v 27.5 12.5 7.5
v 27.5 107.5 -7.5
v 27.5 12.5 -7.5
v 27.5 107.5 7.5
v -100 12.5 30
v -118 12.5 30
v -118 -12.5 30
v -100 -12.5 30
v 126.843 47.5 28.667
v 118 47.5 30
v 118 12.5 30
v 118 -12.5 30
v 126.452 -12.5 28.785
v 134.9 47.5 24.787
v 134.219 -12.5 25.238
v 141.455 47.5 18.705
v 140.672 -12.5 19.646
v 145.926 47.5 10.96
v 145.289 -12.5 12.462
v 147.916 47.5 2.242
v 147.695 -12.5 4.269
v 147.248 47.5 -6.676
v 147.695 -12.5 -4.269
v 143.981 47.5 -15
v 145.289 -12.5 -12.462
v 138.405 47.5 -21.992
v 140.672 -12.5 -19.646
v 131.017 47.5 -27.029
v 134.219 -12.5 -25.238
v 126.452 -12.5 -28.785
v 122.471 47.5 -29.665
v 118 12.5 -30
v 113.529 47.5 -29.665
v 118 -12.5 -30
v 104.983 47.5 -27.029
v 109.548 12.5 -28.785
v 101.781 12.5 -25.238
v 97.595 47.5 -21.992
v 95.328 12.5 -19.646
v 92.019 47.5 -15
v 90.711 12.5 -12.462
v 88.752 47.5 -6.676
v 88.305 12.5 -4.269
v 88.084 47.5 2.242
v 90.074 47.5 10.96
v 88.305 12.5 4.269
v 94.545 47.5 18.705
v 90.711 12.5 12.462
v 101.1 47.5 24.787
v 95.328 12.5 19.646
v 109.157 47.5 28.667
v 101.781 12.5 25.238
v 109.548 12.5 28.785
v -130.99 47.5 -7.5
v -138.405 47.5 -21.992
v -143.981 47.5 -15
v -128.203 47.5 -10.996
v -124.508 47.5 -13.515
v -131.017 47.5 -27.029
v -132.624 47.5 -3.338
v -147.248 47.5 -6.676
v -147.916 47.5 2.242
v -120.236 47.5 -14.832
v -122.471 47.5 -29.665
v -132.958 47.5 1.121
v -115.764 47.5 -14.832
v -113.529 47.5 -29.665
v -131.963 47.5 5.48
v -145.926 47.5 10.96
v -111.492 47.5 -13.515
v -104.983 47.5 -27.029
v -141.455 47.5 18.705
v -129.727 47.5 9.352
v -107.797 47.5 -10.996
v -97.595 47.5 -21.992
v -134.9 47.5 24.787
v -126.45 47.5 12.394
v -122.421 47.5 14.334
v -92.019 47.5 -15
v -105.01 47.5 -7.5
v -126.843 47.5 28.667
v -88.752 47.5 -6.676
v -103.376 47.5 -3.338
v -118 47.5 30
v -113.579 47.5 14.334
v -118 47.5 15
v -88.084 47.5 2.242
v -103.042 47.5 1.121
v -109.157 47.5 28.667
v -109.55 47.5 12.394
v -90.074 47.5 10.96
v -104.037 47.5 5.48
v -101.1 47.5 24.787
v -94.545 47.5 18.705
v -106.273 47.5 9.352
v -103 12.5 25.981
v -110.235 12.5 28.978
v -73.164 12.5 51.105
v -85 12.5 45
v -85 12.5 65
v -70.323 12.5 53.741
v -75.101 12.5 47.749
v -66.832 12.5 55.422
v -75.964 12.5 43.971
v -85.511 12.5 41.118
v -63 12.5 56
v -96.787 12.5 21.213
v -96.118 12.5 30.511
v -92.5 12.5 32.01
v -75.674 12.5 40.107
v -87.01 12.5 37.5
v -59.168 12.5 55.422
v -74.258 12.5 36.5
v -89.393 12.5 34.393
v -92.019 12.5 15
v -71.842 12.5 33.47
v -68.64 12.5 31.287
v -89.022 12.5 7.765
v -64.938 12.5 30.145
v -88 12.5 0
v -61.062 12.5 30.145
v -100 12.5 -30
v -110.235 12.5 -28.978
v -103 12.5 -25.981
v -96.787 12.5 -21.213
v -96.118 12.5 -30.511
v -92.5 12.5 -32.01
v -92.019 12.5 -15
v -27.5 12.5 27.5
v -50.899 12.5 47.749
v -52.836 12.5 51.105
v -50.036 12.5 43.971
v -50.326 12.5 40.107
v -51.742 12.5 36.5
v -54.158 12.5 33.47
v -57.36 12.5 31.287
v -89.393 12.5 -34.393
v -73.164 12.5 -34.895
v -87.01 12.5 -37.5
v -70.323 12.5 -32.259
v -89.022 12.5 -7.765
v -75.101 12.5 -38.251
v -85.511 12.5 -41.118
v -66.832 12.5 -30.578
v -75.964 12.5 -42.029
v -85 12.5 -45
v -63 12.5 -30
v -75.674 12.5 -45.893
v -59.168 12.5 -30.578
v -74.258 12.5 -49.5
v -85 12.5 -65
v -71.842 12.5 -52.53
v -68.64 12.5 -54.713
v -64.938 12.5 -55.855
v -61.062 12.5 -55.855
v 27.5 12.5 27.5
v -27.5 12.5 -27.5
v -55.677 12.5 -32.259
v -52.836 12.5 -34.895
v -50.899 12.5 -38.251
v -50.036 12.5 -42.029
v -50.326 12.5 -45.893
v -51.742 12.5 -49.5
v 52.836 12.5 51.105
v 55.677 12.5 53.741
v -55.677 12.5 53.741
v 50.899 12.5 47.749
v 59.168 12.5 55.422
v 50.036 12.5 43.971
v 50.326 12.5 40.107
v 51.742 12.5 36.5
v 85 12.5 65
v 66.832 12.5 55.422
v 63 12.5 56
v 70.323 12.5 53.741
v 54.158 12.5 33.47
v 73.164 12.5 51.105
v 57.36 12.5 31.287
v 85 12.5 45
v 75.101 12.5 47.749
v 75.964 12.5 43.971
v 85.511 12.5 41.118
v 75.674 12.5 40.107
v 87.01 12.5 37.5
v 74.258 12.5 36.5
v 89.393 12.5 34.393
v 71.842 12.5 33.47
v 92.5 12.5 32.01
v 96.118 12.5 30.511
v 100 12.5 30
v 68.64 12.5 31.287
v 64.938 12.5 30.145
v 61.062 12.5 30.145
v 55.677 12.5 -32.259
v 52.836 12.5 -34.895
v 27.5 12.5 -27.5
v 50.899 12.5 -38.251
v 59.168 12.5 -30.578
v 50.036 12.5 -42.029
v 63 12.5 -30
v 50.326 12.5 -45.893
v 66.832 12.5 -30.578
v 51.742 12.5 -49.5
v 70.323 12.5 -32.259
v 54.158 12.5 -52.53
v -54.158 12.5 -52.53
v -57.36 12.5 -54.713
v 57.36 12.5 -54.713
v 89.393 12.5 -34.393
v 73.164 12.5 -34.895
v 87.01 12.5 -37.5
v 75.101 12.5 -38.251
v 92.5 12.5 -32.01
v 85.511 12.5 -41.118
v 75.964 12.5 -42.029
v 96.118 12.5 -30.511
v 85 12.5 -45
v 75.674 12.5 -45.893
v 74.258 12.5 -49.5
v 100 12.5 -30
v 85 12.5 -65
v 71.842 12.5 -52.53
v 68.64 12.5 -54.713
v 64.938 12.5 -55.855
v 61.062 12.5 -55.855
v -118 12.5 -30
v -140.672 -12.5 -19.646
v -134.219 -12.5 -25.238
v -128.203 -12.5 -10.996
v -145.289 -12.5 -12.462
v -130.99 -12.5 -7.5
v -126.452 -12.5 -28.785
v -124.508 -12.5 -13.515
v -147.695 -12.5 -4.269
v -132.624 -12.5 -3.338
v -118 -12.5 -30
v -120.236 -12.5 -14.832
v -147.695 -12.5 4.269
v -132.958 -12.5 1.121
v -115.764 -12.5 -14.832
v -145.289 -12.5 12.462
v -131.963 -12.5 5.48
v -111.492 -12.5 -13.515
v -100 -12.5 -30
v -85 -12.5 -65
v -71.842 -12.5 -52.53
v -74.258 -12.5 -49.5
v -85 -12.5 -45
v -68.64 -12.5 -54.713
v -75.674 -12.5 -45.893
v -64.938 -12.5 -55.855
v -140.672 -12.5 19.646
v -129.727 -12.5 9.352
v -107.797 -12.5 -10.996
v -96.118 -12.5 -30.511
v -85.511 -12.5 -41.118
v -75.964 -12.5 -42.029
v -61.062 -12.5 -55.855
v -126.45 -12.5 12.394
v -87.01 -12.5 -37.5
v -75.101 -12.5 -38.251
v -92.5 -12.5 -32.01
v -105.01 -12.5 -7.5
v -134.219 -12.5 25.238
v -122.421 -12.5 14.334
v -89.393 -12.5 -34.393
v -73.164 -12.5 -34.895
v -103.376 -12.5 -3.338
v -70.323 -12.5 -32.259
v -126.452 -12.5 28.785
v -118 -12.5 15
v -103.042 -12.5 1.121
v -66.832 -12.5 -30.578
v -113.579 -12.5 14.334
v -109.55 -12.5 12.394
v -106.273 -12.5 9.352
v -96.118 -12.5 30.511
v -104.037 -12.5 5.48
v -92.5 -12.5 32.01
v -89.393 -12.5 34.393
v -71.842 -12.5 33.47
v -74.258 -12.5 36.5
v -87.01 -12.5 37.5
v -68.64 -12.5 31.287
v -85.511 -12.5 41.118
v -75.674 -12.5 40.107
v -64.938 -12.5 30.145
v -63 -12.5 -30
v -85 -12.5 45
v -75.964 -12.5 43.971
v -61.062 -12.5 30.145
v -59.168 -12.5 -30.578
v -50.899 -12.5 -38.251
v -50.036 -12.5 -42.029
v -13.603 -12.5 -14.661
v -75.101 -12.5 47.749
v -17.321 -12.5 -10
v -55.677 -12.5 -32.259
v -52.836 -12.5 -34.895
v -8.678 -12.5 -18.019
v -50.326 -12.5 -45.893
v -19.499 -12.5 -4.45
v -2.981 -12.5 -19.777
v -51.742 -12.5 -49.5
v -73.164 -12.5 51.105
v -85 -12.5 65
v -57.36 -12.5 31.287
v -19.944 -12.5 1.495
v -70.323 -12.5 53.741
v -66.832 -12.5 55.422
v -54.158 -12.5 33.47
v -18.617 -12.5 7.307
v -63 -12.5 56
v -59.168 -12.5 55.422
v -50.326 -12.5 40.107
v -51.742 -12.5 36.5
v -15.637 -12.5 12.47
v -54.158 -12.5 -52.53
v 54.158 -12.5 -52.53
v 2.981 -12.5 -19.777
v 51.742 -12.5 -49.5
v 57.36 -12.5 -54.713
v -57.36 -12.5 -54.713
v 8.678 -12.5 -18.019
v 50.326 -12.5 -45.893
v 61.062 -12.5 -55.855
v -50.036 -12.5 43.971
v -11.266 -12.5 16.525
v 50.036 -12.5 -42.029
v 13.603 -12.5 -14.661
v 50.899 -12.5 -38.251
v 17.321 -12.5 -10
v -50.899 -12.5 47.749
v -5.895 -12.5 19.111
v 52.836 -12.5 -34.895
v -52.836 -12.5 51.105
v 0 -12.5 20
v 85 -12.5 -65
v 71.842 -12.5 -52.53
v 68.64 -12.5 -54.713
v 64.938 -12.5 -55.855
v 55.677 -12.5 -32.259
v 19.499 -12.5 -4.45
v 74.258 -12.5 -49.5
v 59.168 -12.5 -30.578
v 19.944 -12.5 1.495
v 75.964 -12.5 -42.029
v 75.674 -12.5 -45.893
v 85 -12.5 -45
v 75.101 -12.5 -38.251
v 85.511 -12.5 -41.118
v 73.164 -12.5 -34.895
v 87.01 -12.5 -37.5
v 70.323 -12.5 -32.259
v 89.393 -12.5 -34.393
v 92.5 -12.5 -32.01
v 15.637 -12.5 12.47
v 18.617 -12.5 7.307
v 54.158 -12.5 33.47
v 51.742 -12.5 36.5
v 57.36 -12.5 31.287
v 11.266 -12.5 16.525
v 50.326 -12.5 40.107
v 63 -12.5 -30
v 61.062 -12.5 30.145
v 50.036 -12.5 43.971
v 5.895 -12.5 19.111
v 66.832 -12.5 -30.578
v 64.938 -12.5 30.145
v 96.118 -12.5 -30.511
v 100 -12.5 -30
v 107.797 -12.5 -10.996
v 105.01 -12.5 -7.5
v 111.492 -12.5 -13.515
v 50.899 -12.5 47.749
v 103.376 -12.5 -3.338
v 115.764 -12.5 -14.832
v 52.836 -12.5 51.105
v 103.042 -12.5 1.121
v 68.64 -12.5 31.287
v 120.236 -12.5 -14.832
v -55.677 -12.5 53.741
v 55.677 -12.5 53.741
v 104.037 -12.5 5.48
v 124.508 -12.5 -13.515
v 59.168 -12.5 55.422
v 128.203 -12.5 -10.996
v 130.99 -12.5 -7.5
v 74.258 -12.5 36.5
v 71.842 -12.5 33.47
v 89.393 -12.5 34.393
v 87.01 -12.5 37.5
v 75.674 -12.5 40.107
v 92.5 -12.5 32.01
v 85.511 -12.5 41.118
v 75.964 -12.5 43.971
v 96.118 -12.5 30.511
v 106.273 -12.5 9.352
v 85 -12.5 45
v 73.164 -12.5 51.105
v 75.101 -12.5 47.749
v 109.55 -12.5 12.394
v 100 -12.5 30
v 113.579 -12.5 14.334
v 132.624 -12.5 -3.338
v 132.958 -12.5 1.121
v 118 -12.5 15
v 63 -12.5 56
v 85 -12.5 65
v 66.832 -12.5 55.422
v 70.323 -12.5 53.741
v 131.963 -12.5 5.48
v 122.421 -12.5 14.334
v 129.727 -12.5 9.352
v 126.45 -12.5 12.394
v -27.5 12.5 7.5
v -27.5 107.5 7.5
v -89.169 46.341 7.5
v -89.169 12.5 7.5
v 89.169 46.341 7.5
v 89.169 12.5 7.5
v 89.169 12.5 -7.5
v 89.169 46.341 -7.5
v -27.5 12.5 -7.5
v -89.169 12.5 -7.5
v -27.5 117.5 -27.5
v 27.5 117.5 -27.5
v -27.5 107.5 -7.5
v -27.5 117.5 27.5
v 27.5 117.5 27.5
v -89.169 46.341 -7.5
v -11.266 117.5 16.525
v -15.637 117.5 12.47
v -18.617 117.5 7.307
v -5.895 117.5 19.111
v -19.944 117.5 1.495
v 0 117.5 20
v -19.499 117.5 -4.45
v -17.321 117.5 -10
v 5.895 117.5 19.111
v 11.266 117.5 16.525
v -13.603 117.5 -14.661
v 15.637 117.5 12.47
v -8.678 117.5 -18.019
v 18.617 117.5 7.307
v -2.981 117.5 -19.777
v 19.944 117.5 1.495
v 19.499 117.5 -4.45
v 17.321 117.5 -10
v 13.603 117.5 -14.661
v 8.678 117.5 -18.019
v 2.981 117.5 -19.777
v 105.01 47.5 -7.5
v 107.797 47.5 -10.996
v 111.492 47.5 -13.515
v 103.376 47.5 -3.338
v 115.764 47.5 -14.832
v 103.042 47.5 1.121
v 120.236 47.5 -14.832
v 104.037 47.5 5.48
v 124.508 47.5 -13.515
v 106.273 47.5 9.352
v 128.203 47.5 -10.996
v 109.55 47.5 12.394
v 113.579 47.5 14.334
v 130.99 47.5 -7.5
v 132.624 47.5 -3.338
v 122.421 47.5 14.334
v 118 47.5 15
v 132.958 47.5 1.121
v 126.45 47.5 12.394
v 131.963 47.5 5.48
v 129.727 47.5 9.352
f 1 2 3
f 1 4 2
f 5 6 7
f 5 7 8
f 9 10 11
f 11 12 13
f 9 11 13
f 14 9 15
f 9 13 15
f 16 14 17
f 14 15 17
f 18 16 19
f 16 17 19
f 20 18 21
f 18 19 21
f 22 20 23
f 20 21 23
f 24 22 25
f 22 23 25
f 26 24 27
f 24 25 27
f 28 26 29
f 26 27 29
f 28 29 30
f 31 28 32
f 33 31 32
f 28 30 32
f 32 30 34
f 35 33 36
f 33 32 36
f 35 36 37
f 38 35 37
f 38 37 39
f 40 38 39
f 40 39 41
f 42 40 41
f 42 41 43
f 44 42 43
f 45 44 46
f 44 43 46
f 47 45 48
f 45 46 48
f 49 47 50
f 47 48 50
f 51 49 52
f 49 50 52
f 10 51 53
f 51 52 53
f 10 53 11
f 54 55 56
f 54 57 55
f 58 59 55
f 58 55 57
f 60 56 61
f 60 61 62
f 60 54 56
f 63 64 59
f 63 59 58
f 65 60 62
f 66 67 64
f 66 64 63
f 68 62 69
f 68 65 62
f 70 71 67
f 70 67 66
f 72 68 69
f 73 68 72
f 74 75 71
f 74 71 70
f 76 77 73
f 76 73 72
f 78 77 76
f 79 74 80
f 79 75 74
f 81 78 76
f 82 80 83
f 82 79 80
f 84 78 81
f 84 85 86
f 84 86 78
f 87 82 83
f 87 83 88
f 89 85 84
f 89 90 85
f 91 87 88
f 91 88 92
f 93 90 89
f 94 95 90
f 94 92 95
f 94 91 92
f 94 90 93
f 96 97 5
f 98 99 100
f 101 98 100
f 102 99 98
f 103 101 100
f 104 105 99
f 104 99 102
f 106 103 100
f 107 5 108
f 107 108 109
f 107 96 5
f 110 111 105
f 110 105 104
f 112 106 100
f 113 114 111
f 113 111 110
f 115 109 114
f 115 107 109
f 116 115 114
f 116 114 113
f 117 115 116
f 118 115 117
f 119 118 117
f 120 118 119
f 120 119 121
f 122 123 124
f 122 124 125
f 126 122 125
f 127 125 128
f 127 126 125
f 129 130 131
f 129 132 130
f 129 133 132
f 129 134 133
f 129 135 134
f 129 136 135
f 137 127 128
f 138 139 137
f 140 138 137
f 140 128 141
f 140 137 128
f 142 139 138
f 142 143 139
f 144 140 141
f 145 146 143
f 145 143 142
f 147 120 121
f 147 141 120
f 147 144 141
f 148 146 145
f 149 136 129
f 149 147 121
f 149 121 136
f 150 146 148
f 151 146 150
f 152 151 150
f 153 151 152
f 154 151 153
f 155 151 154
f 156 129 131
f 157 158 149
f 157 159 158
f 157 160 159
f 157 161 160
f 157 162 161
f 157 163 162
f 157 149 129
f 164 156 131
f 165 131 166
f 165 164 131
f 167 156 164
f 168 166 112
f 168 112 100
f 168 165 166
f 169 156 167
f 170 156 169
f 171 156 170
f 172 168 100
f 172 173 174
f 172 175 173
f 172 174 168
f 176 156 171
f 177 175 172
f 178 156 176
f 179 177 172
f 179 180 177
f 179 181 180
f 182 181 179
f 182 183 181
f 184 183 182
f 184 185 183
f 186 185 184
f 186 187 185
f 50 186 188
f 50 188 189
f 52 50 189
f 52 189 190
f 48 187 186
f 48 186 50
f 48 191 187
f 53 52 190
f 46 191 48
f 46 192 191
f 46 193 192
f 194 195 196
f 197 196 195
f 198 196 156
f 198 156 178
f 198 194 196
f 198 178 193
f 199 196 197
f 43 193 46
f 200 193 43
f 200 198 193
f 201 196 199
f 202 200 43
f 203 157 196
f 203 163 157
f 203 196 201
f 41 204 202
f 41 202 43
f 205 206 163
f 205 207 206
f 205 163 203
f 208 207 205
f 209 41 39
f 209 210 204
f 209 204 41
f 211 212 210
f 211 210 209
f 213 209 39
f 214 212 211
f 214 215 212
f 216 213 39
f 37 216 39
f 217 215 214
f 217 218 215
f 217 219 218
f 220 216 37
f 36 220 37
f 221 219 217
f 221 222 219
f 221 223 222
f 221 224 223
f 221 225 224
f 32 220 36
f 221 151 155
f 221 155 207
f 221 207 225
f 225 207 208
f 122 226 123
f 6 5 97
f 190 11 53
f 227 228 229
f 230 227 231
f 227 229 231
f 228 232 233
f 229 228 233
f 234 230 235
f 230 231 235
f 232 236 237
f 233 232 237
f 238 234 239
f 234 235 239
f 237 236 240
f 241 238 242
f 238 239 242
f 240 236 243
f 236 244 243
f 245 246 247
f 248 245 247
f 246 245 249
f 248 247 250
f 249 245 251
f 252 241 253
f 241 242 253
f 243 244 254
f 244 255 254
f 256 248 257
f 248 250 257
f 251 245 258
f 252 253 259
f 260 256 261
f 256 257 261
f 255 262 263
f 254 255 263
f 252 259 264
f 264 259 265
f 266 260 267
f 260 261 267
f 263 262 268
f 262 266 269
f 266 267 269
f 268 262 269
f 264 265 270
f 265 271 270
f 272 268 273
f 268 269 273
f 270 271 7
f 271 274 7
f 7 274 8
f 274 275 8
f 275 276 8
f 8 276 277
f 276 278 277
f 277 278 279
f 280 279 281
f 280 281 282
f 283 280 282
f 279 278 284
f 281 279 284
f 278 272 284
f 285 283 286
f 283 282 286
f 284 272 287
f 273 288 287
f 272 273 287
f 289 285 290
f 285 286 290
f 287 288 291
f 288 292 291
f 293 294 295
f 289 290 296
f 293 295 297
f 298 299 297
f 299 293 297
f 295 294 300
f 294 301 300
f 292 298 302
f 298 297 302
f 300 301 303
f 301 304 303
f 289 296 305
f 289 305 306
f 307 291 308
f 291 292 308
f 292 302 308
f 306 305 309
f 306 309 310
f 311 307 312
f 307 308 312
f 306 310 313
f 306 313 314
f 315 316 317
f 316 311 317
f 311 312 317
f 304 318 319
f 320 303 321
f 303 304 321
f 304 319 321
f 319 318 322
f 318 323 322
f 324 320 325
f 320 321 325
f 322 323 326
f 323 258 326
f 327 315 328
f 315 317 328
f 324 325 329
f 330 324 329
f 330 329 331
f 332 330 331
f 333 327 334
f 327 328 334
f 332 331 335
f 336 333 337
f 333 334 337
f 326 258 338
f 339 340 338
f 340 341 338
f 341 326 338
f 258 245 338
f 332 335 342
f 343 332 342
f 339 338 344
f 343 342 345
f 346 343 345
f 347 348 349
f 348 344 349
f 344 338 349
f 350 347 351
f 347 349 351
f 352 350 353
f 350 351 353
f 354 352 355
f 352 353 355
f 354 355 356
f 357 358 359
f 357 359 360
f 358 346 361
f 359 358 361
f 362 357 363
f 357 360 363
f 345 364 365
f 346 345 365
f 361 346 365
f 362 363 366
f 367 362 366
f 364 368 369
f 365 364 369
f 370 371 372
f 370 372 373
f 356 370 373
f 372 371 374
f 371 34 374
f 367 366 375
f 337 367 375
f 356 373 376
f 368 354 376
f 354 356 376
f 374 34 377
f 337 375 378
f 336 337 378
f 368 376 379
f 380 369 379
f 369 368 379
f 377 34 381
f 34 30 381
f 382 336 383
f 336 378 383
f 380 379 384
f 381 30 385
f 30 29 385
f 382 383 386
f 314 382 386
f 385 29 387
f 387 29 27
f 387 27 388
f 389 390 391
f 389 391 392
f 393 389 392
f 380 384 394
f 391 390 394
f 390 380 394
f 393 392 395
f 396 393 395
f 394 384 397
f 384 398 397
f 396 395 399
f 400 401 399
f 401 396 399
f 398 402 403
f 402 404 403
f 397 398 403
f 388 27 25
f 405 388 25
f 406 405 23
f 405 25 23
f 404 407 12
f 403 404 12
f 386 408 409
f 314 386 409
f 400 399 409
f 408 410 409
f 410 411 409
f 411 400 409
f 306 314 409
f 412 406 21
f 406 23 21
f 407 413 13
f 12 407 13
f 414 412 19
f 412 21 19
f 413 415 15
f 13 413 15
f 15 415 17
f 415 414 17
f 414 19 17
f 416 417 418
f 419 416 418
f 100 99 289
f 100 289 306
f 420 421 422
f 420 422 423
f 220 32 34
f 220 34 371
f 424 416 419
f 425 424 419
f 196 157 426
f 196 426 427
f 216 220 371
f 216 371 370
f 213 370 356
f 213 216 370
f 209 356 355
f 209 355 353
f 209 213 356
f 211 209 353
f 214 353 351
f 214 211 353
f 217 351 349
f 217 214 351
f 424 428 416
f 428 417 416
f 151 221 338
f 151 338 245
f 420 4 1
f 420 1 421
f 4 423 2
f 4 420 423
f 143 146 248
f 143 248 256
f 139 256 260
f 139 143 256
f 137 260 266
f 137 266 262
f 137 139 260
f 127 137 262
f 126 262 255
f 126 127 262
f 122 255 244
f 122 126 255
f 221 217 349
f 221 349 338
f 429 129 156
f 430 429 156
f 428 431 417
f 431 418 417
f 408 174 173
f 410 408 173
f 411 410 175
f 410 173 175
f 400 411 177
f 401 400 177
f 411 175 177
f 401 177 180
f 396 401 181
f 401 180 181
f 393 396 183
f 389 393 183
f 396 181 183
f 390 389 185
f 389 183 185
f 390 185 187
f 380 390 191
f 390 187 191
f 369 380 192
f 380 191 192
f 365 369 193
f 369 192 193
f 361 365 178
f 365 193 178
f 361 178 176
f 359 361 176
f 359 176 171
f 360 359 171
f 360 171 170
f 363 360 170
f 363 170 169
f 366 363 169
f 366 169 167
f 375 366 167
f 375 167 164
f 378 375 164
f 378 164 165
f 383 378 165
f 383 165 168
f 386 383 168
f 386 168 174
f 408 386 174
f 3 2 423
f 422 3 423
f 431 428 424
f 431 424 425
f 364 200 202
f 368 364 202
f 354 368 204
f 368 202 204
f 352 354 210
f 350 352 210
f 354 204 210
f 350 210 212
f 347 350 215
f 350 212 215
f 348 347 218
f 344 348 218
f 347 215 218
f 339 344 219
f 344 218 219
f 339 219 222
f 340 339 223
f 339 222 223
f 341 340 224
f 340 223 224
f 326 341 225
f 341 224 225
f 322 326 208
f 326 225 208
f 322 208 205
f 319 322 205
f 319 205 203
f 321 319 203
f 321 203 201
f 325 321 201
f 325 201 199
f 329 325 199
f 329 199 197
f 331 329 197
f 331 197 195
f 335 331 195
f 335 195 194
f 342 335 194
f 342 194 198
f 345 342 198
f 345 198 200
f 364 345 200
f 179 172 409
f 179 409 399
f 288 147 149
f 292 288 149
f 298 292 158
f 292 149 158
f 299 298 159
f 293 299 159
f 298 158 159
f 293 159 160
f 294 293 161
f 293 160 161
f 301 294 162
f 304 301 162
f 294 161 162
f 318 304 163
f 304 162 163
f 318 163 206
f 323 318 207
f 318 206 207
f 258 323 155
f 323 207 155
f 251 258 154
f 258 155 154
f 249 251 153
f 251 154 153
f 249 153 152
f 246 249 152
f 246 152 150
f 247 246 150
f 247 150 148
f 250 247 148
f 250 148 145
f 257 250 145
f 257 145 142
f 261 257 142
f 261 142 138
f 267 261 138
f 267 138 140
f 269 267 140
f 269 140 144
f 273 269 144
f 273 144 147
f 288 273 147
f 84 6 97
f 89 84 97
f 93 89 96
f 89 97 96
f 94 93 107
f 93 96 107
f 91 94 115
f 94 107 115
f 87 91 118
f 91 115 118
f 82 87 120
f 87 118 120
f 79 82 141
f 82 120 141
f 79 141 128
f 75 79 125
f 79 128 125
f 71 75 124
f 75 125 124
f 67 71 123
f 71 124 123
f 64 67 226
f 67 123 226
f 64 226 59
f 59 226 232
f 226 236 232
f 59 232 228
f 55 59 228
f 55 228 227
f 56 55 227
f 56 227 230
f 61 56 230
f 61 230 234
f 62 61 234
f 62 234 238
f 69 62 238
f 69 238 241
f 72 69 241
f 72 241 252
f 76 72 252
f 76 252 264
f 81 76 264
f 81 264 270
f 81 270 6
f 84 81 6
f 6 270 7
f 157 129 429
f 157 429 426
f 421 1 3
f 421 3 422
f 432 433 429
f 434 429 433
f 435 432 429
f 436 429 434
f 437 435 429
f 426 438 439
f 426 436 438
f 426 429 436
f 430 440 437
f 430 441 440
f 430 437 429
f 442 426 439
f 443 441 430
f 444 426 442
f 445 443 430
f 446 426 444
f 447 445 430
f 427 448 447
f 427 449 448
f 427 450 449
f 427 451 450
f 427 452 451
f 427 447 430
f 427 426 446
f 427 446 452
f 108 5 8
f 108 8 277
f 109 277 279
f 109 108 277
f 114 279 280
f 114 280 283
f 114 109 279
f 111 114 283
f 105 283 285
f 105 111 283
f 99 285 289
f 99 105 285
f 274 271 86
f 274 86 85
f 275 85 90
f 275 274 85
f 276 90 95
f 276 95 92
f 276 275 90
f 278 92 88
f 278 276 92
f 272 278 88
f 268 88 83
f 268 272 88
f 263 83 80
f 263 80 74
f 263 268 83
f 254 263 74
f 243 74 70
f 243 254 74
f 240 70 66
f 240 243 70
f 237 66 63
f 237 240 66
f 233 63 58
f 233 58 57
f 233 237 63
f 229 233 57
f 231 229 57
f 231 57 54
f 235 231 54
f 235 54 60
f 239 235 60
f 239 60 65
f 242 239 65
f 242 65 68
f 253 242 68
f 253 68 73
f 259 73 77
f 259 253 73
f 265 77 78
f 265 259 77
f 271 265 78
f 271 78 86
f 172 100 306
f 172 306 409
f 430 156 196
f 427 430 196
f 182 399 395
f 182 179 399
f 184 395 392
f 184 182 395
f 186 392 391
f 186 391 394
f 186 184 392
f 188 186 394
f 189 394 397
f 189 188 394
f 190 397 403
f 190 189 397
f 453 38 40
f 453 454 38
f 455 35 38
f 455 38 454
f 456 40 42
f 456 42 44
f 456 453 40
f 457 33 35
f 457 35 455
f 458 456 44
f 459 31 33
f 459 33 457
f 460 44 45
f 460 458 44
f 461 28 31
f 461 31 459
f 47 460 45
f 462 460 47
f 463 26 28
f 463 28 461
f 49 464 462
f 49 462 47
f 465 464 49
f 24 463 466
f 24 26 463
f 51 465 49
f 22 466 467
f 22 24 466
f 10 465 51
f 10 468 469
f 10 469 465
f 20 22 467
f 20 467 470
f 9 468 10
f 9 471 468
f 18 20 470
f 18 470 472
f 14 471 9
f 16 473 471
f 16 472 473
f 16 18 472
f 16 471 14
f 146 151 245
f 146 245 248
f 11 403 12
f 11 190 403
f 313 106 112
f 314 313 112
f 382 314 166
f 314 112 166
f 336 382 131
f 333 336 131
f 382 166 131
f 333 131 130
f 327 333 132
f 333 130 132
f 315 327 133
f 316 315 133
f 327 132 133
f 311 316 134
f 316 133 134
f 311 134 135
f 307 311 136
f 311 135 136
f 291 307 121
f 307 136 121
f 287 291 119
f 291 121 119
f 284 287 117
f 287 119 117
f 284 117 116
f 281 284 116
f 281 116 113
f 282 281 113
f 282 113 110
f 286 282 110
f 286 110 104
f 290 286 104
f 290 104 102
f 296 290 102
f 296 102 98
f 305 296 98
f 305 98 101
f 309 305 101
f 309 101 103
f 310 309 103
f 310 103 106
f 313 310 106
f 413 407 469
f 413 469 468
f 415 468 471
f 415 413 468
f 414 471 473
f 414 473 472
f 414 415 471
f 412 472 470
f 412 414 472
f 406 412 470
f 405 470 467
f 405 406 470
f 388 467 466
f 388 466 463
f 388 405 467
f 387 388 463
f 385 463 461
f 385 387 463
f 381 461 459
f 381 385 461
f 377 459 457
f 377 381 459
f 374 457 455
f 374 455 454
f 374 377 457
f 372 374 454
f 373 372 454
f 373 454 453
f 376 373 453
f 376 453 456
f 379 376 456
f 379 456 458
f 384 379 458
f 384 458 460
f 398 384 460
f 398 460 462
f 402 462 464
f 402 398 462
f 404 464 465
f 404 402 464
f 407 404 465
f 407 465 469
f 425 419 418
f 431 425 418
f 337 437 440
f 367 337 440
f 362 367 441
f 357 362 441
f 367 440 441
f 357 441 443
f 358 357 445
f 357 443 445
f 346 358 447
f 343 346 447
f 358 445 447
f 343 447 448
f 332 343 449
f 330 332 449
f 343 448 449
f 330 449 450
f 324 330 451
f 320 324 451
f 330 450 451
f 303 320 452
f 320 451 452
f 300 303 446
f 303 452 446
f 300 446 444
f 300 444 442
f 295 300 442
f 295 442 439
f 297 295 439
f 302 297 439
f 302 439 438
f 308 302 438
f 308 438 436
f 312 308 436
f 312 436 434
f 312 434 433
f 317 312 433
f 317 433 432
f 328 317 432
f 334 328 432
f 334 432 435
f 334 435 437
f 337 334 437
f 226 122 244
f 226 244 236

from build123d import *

# Parameters (mm, degrees)
BOSS_EXTRUDE1_DEPTH      = 12.5
BOSS_EXTRUDE2_DEPTH      = 47.5
BOSS_EXTRUDE2_DEPTH_BACK = 12.5
SKETCH1_3_R              = 30
SKETCH1_3_R_2            = 15
CUT_EXTRUDE1_REACH       = 167.39
SKETCH2_R                = 13
SKETCH3_W                = 55
SKETCH3_H                = 55
BOSS_EXTRUDE3_DEPTH      = 105
CUT_EXTRUDE2_REACH       = 209.434
SKETCH4_R                = 20
BOSS_EXTRUDE5_DEPTH      = 7.5


with BuildPart() as part:
    # Sketch1 → Boss-Extrude1 (new, symmetric)
    with BuildSketch(Plane(origin=(0, 0, 0), x_dir=(1, 0, 0), z_dir=(0, 1, 0))):
        with BuildLine():
            ThreePointArc((118, -30), (88, 0), (118, 30))
            Line((118, 30), (100, 30))
            ThreePointArc((100, 30), (89.393398282, 34.393398282), (85, 45))
            Line((85, 45), (85, 65))
            Line((85, 65), (-85, 65))
            Line((-85, 65), (-85, 45))
            ThreePointArc((-85, 45), (-89.393398282, 34.393398282), (-100, 30))
            Line((-100, 30), (-118, 30))
            ThreePointArc((-118, 30), (-96.786796564, 21.213203436), (-88, 0))
            ThreePointArc((-88, 0), (-96.786796564, -21.213203436), (-118, -30))
            Line((-118, -30), (-100, -30))
            ThreePointArc((-100, -30), (-89.393398282, -34.393398282), (-85, -45))
            Line((-85, -45), (-85, -65))
            Line((-85, -65), (85, -65))
            Line((85, -65), (85, -45))
            ThreePointArc((85, -45), (89.393398282, -34.393398282), (100, -30))
            Line((100, -30), (118, -30))
        make_face()
    extrude(amount=BOSS_EXTRUDE1_DEPTH, both=True)

    # Sketch1<3> → Boss-Extrude2 (add, two sides: drawn at the far end of the back side and taken through both)
    # profile 1 of 2: a face of its own
    with BuildSketch(Plane(origin=(0, 0, 0), x_dir=(1, 0, 0), z_dir=(0, 1, 0)).offset(-BOSS_EXTRUDE2_DEPTH_BACK)):
        with Locations(Location((-118, 0, 0), (0, 0, 270))):
            Circle(SKETCH1_3_R)
        with Locations(Location((-118, 0, 0), (0, 0, 270))):
            Circle(SKETCH1_3_R_2, mode=Mode.SUBTRACT)
    # profile 2 of 2: a face of its own
    with BuildSketch(Plane(origin=(0, 0, 0), x_dir=(1, 0, 0), z_dir=(0, 1, 0)).offset(-BOSS_EXTRUDE2_DEPTH_BACK)):
        with Locations(Location((118, 0, 0), (0, 0, 270))):
            Circle(SKETCH1_3_R)
        with Locations(Location((118, 0, 0), (0, 0, 270))):
            Circle(SKETCH1_3_R_2, mode=Mode.SUBTRACT)
    extrude(amount=BOSS_EXTRUDE2_DEPTH + BOSS_EXTRUDE2_DEPTH_BACK)

    # Sketch2 → Cut-Extrude1 (cut, up to next)
    with BuildSketch(Plane(origin=(0, 12.5, 0), x_dir=(1, 0, 0), z_dir=(0, 1, 0)), mode=Mode.PRIVATE) as cut_extrude1_sk1:
        with Locations(Location((-63, 43, 0), (0, 0, 270))):
            Circle(SKETCH2_R)
    cut_extrude1_tool1 = extrude(cut_extrude1_sk1.sketch, amount=-CUT_EXTRUDE1_REACH, mode=Mode.PRIVATE) & part.part
    # Sketch2 → Cut-Extrude1 (cut, up to next)
    with BuildSketch(Plane(origin=(0, 12.5, 0), x_dir=(1, 0, 0), z_dir=(0, 1, 0)), mode=Mode.PRIVATE) as cut_extrude1_sk2:
        with Locations(Location((-63, -43, 0), (0, 0, 270))):
            Circle(SKETCH2_R)
    cut_extrude1_tool2 = extrude(cut_extrude1_sk2.sketch, amount=-CUT_EXTRUDE1_REACH, mode=Mode.PRIVATE) & part.part
    # Sketch2 → Cut-Extrude1 (cut, up to next)
    with BuildSketch(Plane(origin=(0, 12.5, 0), x_dir=(1, 0, 0), z_dir=(0, 1, 0)), mode=Mode.PRIVATE) as cut_extrude1_sk3:
        with Locations(Location((63, 43, 0), (0, 0, 270))):
            Circle(SKETCH2_R)
    cut_extrude1_tool3 = extrude(cut_extrude1_sk3.sketch, amount=-CUT_EXTRUDE1_REACH, mode=Mode.PRIVATE) & part.part
    # Sketch2 → Cut-Extrude1 (cut, up to next)
    with BuildSketch(Plane(origin=(0, 12.5, 0), x_dir=(1, 0, 0), z_dir=(0, 1, 0)), mode=Mode.PRIVATE) as cut_extrude1_sk4:
        with Locations(Location((63, -43, 0), (0, 0, 270))):
            Circle(SKETCH2_R)
    cut_extrude1_tool4 = extrude(cut_extrude1_sk4.sketch, amount=-CUT_EXTRUDE1_REACH, mode=Mode.PRIVATE) & part.part
    add(cut_extrude1_tool1.solids().sort_by_distance((-63, 12.5, -43))[0], mode=Mode.SUBTRACT)
    add(cut_extrude1_tool2.solids().sort_by_distance((-63, 12.5, 43))[0], mode=Mode.SUBTRACT)
    add(cut_extrude1_tool3.solids().sort_by_distance((63, 12.5, -43))[0], mode=Mode.SUBTRACT)
    add(cut_extrude1_tool4.solids().sort_by_distance((63, 12.5, 43))[0], mode=Mode.SUBTRACT)

    # Sketch3 → Boss-Extrude3 (add)
    with BuildSketch(Plane(origin=(0, 12.5, 0), x_dir=(1, 0, 0), z_dir=(0, 1, 0))):
        Rectangle(SKETCH3_W, SKETCH3_H)
    extrude(amount=BOSS_EXTRUDE3_DEPTH)

    # Sketch4 → Cut-Extrude2 (cut, up to next)
    with BuildSketch(Plane(origin=(0, 117.5, 0), x_dir=(1, 0, 0), z_dir=(0, 1, 0)), mode=Mode.PRIVATE) as cut_extrude2_sk1:
        with Locations(Location((0, 0, 0), (0, 0, 270))):
            Circle(SKETCH4_R)
    cut_extrude2_tool1 = extrude(cut_extrude2_sk1.sketch, amount=-CUT_EXTRUDE2_REACH, mode=Mode.PRIVATE) & part.part
    add(cut_extrude2_tool1.solids().sort_by_distance((0, 117.5, 0))[0], mode=Mode.SUBTRACT)


with BuildPart() as body_2:
    # Sketch6 → Boss-Extrude5 (new, symmetric)
    with BuildSketch(Plane.XY):
        Polygon((-89.168947092, 12.5), (-89.168947092, 46.340713627), (-27.5, 107.5), (-27.5, 12.5), align=None)
    extrude(amount=BOSS_EXTRUDE5_DEPTH, both=True)


with BuildPart() as body_3:
    # Mirror6: mirrored copy
    add(body_2.part.mirror(Plane(origin=(0, 0, 0), x_dir=(0, 0, 1), z_dir=(1, 0, 0))))


solid = Compound([part.part, body_2.part, body_3.part])
